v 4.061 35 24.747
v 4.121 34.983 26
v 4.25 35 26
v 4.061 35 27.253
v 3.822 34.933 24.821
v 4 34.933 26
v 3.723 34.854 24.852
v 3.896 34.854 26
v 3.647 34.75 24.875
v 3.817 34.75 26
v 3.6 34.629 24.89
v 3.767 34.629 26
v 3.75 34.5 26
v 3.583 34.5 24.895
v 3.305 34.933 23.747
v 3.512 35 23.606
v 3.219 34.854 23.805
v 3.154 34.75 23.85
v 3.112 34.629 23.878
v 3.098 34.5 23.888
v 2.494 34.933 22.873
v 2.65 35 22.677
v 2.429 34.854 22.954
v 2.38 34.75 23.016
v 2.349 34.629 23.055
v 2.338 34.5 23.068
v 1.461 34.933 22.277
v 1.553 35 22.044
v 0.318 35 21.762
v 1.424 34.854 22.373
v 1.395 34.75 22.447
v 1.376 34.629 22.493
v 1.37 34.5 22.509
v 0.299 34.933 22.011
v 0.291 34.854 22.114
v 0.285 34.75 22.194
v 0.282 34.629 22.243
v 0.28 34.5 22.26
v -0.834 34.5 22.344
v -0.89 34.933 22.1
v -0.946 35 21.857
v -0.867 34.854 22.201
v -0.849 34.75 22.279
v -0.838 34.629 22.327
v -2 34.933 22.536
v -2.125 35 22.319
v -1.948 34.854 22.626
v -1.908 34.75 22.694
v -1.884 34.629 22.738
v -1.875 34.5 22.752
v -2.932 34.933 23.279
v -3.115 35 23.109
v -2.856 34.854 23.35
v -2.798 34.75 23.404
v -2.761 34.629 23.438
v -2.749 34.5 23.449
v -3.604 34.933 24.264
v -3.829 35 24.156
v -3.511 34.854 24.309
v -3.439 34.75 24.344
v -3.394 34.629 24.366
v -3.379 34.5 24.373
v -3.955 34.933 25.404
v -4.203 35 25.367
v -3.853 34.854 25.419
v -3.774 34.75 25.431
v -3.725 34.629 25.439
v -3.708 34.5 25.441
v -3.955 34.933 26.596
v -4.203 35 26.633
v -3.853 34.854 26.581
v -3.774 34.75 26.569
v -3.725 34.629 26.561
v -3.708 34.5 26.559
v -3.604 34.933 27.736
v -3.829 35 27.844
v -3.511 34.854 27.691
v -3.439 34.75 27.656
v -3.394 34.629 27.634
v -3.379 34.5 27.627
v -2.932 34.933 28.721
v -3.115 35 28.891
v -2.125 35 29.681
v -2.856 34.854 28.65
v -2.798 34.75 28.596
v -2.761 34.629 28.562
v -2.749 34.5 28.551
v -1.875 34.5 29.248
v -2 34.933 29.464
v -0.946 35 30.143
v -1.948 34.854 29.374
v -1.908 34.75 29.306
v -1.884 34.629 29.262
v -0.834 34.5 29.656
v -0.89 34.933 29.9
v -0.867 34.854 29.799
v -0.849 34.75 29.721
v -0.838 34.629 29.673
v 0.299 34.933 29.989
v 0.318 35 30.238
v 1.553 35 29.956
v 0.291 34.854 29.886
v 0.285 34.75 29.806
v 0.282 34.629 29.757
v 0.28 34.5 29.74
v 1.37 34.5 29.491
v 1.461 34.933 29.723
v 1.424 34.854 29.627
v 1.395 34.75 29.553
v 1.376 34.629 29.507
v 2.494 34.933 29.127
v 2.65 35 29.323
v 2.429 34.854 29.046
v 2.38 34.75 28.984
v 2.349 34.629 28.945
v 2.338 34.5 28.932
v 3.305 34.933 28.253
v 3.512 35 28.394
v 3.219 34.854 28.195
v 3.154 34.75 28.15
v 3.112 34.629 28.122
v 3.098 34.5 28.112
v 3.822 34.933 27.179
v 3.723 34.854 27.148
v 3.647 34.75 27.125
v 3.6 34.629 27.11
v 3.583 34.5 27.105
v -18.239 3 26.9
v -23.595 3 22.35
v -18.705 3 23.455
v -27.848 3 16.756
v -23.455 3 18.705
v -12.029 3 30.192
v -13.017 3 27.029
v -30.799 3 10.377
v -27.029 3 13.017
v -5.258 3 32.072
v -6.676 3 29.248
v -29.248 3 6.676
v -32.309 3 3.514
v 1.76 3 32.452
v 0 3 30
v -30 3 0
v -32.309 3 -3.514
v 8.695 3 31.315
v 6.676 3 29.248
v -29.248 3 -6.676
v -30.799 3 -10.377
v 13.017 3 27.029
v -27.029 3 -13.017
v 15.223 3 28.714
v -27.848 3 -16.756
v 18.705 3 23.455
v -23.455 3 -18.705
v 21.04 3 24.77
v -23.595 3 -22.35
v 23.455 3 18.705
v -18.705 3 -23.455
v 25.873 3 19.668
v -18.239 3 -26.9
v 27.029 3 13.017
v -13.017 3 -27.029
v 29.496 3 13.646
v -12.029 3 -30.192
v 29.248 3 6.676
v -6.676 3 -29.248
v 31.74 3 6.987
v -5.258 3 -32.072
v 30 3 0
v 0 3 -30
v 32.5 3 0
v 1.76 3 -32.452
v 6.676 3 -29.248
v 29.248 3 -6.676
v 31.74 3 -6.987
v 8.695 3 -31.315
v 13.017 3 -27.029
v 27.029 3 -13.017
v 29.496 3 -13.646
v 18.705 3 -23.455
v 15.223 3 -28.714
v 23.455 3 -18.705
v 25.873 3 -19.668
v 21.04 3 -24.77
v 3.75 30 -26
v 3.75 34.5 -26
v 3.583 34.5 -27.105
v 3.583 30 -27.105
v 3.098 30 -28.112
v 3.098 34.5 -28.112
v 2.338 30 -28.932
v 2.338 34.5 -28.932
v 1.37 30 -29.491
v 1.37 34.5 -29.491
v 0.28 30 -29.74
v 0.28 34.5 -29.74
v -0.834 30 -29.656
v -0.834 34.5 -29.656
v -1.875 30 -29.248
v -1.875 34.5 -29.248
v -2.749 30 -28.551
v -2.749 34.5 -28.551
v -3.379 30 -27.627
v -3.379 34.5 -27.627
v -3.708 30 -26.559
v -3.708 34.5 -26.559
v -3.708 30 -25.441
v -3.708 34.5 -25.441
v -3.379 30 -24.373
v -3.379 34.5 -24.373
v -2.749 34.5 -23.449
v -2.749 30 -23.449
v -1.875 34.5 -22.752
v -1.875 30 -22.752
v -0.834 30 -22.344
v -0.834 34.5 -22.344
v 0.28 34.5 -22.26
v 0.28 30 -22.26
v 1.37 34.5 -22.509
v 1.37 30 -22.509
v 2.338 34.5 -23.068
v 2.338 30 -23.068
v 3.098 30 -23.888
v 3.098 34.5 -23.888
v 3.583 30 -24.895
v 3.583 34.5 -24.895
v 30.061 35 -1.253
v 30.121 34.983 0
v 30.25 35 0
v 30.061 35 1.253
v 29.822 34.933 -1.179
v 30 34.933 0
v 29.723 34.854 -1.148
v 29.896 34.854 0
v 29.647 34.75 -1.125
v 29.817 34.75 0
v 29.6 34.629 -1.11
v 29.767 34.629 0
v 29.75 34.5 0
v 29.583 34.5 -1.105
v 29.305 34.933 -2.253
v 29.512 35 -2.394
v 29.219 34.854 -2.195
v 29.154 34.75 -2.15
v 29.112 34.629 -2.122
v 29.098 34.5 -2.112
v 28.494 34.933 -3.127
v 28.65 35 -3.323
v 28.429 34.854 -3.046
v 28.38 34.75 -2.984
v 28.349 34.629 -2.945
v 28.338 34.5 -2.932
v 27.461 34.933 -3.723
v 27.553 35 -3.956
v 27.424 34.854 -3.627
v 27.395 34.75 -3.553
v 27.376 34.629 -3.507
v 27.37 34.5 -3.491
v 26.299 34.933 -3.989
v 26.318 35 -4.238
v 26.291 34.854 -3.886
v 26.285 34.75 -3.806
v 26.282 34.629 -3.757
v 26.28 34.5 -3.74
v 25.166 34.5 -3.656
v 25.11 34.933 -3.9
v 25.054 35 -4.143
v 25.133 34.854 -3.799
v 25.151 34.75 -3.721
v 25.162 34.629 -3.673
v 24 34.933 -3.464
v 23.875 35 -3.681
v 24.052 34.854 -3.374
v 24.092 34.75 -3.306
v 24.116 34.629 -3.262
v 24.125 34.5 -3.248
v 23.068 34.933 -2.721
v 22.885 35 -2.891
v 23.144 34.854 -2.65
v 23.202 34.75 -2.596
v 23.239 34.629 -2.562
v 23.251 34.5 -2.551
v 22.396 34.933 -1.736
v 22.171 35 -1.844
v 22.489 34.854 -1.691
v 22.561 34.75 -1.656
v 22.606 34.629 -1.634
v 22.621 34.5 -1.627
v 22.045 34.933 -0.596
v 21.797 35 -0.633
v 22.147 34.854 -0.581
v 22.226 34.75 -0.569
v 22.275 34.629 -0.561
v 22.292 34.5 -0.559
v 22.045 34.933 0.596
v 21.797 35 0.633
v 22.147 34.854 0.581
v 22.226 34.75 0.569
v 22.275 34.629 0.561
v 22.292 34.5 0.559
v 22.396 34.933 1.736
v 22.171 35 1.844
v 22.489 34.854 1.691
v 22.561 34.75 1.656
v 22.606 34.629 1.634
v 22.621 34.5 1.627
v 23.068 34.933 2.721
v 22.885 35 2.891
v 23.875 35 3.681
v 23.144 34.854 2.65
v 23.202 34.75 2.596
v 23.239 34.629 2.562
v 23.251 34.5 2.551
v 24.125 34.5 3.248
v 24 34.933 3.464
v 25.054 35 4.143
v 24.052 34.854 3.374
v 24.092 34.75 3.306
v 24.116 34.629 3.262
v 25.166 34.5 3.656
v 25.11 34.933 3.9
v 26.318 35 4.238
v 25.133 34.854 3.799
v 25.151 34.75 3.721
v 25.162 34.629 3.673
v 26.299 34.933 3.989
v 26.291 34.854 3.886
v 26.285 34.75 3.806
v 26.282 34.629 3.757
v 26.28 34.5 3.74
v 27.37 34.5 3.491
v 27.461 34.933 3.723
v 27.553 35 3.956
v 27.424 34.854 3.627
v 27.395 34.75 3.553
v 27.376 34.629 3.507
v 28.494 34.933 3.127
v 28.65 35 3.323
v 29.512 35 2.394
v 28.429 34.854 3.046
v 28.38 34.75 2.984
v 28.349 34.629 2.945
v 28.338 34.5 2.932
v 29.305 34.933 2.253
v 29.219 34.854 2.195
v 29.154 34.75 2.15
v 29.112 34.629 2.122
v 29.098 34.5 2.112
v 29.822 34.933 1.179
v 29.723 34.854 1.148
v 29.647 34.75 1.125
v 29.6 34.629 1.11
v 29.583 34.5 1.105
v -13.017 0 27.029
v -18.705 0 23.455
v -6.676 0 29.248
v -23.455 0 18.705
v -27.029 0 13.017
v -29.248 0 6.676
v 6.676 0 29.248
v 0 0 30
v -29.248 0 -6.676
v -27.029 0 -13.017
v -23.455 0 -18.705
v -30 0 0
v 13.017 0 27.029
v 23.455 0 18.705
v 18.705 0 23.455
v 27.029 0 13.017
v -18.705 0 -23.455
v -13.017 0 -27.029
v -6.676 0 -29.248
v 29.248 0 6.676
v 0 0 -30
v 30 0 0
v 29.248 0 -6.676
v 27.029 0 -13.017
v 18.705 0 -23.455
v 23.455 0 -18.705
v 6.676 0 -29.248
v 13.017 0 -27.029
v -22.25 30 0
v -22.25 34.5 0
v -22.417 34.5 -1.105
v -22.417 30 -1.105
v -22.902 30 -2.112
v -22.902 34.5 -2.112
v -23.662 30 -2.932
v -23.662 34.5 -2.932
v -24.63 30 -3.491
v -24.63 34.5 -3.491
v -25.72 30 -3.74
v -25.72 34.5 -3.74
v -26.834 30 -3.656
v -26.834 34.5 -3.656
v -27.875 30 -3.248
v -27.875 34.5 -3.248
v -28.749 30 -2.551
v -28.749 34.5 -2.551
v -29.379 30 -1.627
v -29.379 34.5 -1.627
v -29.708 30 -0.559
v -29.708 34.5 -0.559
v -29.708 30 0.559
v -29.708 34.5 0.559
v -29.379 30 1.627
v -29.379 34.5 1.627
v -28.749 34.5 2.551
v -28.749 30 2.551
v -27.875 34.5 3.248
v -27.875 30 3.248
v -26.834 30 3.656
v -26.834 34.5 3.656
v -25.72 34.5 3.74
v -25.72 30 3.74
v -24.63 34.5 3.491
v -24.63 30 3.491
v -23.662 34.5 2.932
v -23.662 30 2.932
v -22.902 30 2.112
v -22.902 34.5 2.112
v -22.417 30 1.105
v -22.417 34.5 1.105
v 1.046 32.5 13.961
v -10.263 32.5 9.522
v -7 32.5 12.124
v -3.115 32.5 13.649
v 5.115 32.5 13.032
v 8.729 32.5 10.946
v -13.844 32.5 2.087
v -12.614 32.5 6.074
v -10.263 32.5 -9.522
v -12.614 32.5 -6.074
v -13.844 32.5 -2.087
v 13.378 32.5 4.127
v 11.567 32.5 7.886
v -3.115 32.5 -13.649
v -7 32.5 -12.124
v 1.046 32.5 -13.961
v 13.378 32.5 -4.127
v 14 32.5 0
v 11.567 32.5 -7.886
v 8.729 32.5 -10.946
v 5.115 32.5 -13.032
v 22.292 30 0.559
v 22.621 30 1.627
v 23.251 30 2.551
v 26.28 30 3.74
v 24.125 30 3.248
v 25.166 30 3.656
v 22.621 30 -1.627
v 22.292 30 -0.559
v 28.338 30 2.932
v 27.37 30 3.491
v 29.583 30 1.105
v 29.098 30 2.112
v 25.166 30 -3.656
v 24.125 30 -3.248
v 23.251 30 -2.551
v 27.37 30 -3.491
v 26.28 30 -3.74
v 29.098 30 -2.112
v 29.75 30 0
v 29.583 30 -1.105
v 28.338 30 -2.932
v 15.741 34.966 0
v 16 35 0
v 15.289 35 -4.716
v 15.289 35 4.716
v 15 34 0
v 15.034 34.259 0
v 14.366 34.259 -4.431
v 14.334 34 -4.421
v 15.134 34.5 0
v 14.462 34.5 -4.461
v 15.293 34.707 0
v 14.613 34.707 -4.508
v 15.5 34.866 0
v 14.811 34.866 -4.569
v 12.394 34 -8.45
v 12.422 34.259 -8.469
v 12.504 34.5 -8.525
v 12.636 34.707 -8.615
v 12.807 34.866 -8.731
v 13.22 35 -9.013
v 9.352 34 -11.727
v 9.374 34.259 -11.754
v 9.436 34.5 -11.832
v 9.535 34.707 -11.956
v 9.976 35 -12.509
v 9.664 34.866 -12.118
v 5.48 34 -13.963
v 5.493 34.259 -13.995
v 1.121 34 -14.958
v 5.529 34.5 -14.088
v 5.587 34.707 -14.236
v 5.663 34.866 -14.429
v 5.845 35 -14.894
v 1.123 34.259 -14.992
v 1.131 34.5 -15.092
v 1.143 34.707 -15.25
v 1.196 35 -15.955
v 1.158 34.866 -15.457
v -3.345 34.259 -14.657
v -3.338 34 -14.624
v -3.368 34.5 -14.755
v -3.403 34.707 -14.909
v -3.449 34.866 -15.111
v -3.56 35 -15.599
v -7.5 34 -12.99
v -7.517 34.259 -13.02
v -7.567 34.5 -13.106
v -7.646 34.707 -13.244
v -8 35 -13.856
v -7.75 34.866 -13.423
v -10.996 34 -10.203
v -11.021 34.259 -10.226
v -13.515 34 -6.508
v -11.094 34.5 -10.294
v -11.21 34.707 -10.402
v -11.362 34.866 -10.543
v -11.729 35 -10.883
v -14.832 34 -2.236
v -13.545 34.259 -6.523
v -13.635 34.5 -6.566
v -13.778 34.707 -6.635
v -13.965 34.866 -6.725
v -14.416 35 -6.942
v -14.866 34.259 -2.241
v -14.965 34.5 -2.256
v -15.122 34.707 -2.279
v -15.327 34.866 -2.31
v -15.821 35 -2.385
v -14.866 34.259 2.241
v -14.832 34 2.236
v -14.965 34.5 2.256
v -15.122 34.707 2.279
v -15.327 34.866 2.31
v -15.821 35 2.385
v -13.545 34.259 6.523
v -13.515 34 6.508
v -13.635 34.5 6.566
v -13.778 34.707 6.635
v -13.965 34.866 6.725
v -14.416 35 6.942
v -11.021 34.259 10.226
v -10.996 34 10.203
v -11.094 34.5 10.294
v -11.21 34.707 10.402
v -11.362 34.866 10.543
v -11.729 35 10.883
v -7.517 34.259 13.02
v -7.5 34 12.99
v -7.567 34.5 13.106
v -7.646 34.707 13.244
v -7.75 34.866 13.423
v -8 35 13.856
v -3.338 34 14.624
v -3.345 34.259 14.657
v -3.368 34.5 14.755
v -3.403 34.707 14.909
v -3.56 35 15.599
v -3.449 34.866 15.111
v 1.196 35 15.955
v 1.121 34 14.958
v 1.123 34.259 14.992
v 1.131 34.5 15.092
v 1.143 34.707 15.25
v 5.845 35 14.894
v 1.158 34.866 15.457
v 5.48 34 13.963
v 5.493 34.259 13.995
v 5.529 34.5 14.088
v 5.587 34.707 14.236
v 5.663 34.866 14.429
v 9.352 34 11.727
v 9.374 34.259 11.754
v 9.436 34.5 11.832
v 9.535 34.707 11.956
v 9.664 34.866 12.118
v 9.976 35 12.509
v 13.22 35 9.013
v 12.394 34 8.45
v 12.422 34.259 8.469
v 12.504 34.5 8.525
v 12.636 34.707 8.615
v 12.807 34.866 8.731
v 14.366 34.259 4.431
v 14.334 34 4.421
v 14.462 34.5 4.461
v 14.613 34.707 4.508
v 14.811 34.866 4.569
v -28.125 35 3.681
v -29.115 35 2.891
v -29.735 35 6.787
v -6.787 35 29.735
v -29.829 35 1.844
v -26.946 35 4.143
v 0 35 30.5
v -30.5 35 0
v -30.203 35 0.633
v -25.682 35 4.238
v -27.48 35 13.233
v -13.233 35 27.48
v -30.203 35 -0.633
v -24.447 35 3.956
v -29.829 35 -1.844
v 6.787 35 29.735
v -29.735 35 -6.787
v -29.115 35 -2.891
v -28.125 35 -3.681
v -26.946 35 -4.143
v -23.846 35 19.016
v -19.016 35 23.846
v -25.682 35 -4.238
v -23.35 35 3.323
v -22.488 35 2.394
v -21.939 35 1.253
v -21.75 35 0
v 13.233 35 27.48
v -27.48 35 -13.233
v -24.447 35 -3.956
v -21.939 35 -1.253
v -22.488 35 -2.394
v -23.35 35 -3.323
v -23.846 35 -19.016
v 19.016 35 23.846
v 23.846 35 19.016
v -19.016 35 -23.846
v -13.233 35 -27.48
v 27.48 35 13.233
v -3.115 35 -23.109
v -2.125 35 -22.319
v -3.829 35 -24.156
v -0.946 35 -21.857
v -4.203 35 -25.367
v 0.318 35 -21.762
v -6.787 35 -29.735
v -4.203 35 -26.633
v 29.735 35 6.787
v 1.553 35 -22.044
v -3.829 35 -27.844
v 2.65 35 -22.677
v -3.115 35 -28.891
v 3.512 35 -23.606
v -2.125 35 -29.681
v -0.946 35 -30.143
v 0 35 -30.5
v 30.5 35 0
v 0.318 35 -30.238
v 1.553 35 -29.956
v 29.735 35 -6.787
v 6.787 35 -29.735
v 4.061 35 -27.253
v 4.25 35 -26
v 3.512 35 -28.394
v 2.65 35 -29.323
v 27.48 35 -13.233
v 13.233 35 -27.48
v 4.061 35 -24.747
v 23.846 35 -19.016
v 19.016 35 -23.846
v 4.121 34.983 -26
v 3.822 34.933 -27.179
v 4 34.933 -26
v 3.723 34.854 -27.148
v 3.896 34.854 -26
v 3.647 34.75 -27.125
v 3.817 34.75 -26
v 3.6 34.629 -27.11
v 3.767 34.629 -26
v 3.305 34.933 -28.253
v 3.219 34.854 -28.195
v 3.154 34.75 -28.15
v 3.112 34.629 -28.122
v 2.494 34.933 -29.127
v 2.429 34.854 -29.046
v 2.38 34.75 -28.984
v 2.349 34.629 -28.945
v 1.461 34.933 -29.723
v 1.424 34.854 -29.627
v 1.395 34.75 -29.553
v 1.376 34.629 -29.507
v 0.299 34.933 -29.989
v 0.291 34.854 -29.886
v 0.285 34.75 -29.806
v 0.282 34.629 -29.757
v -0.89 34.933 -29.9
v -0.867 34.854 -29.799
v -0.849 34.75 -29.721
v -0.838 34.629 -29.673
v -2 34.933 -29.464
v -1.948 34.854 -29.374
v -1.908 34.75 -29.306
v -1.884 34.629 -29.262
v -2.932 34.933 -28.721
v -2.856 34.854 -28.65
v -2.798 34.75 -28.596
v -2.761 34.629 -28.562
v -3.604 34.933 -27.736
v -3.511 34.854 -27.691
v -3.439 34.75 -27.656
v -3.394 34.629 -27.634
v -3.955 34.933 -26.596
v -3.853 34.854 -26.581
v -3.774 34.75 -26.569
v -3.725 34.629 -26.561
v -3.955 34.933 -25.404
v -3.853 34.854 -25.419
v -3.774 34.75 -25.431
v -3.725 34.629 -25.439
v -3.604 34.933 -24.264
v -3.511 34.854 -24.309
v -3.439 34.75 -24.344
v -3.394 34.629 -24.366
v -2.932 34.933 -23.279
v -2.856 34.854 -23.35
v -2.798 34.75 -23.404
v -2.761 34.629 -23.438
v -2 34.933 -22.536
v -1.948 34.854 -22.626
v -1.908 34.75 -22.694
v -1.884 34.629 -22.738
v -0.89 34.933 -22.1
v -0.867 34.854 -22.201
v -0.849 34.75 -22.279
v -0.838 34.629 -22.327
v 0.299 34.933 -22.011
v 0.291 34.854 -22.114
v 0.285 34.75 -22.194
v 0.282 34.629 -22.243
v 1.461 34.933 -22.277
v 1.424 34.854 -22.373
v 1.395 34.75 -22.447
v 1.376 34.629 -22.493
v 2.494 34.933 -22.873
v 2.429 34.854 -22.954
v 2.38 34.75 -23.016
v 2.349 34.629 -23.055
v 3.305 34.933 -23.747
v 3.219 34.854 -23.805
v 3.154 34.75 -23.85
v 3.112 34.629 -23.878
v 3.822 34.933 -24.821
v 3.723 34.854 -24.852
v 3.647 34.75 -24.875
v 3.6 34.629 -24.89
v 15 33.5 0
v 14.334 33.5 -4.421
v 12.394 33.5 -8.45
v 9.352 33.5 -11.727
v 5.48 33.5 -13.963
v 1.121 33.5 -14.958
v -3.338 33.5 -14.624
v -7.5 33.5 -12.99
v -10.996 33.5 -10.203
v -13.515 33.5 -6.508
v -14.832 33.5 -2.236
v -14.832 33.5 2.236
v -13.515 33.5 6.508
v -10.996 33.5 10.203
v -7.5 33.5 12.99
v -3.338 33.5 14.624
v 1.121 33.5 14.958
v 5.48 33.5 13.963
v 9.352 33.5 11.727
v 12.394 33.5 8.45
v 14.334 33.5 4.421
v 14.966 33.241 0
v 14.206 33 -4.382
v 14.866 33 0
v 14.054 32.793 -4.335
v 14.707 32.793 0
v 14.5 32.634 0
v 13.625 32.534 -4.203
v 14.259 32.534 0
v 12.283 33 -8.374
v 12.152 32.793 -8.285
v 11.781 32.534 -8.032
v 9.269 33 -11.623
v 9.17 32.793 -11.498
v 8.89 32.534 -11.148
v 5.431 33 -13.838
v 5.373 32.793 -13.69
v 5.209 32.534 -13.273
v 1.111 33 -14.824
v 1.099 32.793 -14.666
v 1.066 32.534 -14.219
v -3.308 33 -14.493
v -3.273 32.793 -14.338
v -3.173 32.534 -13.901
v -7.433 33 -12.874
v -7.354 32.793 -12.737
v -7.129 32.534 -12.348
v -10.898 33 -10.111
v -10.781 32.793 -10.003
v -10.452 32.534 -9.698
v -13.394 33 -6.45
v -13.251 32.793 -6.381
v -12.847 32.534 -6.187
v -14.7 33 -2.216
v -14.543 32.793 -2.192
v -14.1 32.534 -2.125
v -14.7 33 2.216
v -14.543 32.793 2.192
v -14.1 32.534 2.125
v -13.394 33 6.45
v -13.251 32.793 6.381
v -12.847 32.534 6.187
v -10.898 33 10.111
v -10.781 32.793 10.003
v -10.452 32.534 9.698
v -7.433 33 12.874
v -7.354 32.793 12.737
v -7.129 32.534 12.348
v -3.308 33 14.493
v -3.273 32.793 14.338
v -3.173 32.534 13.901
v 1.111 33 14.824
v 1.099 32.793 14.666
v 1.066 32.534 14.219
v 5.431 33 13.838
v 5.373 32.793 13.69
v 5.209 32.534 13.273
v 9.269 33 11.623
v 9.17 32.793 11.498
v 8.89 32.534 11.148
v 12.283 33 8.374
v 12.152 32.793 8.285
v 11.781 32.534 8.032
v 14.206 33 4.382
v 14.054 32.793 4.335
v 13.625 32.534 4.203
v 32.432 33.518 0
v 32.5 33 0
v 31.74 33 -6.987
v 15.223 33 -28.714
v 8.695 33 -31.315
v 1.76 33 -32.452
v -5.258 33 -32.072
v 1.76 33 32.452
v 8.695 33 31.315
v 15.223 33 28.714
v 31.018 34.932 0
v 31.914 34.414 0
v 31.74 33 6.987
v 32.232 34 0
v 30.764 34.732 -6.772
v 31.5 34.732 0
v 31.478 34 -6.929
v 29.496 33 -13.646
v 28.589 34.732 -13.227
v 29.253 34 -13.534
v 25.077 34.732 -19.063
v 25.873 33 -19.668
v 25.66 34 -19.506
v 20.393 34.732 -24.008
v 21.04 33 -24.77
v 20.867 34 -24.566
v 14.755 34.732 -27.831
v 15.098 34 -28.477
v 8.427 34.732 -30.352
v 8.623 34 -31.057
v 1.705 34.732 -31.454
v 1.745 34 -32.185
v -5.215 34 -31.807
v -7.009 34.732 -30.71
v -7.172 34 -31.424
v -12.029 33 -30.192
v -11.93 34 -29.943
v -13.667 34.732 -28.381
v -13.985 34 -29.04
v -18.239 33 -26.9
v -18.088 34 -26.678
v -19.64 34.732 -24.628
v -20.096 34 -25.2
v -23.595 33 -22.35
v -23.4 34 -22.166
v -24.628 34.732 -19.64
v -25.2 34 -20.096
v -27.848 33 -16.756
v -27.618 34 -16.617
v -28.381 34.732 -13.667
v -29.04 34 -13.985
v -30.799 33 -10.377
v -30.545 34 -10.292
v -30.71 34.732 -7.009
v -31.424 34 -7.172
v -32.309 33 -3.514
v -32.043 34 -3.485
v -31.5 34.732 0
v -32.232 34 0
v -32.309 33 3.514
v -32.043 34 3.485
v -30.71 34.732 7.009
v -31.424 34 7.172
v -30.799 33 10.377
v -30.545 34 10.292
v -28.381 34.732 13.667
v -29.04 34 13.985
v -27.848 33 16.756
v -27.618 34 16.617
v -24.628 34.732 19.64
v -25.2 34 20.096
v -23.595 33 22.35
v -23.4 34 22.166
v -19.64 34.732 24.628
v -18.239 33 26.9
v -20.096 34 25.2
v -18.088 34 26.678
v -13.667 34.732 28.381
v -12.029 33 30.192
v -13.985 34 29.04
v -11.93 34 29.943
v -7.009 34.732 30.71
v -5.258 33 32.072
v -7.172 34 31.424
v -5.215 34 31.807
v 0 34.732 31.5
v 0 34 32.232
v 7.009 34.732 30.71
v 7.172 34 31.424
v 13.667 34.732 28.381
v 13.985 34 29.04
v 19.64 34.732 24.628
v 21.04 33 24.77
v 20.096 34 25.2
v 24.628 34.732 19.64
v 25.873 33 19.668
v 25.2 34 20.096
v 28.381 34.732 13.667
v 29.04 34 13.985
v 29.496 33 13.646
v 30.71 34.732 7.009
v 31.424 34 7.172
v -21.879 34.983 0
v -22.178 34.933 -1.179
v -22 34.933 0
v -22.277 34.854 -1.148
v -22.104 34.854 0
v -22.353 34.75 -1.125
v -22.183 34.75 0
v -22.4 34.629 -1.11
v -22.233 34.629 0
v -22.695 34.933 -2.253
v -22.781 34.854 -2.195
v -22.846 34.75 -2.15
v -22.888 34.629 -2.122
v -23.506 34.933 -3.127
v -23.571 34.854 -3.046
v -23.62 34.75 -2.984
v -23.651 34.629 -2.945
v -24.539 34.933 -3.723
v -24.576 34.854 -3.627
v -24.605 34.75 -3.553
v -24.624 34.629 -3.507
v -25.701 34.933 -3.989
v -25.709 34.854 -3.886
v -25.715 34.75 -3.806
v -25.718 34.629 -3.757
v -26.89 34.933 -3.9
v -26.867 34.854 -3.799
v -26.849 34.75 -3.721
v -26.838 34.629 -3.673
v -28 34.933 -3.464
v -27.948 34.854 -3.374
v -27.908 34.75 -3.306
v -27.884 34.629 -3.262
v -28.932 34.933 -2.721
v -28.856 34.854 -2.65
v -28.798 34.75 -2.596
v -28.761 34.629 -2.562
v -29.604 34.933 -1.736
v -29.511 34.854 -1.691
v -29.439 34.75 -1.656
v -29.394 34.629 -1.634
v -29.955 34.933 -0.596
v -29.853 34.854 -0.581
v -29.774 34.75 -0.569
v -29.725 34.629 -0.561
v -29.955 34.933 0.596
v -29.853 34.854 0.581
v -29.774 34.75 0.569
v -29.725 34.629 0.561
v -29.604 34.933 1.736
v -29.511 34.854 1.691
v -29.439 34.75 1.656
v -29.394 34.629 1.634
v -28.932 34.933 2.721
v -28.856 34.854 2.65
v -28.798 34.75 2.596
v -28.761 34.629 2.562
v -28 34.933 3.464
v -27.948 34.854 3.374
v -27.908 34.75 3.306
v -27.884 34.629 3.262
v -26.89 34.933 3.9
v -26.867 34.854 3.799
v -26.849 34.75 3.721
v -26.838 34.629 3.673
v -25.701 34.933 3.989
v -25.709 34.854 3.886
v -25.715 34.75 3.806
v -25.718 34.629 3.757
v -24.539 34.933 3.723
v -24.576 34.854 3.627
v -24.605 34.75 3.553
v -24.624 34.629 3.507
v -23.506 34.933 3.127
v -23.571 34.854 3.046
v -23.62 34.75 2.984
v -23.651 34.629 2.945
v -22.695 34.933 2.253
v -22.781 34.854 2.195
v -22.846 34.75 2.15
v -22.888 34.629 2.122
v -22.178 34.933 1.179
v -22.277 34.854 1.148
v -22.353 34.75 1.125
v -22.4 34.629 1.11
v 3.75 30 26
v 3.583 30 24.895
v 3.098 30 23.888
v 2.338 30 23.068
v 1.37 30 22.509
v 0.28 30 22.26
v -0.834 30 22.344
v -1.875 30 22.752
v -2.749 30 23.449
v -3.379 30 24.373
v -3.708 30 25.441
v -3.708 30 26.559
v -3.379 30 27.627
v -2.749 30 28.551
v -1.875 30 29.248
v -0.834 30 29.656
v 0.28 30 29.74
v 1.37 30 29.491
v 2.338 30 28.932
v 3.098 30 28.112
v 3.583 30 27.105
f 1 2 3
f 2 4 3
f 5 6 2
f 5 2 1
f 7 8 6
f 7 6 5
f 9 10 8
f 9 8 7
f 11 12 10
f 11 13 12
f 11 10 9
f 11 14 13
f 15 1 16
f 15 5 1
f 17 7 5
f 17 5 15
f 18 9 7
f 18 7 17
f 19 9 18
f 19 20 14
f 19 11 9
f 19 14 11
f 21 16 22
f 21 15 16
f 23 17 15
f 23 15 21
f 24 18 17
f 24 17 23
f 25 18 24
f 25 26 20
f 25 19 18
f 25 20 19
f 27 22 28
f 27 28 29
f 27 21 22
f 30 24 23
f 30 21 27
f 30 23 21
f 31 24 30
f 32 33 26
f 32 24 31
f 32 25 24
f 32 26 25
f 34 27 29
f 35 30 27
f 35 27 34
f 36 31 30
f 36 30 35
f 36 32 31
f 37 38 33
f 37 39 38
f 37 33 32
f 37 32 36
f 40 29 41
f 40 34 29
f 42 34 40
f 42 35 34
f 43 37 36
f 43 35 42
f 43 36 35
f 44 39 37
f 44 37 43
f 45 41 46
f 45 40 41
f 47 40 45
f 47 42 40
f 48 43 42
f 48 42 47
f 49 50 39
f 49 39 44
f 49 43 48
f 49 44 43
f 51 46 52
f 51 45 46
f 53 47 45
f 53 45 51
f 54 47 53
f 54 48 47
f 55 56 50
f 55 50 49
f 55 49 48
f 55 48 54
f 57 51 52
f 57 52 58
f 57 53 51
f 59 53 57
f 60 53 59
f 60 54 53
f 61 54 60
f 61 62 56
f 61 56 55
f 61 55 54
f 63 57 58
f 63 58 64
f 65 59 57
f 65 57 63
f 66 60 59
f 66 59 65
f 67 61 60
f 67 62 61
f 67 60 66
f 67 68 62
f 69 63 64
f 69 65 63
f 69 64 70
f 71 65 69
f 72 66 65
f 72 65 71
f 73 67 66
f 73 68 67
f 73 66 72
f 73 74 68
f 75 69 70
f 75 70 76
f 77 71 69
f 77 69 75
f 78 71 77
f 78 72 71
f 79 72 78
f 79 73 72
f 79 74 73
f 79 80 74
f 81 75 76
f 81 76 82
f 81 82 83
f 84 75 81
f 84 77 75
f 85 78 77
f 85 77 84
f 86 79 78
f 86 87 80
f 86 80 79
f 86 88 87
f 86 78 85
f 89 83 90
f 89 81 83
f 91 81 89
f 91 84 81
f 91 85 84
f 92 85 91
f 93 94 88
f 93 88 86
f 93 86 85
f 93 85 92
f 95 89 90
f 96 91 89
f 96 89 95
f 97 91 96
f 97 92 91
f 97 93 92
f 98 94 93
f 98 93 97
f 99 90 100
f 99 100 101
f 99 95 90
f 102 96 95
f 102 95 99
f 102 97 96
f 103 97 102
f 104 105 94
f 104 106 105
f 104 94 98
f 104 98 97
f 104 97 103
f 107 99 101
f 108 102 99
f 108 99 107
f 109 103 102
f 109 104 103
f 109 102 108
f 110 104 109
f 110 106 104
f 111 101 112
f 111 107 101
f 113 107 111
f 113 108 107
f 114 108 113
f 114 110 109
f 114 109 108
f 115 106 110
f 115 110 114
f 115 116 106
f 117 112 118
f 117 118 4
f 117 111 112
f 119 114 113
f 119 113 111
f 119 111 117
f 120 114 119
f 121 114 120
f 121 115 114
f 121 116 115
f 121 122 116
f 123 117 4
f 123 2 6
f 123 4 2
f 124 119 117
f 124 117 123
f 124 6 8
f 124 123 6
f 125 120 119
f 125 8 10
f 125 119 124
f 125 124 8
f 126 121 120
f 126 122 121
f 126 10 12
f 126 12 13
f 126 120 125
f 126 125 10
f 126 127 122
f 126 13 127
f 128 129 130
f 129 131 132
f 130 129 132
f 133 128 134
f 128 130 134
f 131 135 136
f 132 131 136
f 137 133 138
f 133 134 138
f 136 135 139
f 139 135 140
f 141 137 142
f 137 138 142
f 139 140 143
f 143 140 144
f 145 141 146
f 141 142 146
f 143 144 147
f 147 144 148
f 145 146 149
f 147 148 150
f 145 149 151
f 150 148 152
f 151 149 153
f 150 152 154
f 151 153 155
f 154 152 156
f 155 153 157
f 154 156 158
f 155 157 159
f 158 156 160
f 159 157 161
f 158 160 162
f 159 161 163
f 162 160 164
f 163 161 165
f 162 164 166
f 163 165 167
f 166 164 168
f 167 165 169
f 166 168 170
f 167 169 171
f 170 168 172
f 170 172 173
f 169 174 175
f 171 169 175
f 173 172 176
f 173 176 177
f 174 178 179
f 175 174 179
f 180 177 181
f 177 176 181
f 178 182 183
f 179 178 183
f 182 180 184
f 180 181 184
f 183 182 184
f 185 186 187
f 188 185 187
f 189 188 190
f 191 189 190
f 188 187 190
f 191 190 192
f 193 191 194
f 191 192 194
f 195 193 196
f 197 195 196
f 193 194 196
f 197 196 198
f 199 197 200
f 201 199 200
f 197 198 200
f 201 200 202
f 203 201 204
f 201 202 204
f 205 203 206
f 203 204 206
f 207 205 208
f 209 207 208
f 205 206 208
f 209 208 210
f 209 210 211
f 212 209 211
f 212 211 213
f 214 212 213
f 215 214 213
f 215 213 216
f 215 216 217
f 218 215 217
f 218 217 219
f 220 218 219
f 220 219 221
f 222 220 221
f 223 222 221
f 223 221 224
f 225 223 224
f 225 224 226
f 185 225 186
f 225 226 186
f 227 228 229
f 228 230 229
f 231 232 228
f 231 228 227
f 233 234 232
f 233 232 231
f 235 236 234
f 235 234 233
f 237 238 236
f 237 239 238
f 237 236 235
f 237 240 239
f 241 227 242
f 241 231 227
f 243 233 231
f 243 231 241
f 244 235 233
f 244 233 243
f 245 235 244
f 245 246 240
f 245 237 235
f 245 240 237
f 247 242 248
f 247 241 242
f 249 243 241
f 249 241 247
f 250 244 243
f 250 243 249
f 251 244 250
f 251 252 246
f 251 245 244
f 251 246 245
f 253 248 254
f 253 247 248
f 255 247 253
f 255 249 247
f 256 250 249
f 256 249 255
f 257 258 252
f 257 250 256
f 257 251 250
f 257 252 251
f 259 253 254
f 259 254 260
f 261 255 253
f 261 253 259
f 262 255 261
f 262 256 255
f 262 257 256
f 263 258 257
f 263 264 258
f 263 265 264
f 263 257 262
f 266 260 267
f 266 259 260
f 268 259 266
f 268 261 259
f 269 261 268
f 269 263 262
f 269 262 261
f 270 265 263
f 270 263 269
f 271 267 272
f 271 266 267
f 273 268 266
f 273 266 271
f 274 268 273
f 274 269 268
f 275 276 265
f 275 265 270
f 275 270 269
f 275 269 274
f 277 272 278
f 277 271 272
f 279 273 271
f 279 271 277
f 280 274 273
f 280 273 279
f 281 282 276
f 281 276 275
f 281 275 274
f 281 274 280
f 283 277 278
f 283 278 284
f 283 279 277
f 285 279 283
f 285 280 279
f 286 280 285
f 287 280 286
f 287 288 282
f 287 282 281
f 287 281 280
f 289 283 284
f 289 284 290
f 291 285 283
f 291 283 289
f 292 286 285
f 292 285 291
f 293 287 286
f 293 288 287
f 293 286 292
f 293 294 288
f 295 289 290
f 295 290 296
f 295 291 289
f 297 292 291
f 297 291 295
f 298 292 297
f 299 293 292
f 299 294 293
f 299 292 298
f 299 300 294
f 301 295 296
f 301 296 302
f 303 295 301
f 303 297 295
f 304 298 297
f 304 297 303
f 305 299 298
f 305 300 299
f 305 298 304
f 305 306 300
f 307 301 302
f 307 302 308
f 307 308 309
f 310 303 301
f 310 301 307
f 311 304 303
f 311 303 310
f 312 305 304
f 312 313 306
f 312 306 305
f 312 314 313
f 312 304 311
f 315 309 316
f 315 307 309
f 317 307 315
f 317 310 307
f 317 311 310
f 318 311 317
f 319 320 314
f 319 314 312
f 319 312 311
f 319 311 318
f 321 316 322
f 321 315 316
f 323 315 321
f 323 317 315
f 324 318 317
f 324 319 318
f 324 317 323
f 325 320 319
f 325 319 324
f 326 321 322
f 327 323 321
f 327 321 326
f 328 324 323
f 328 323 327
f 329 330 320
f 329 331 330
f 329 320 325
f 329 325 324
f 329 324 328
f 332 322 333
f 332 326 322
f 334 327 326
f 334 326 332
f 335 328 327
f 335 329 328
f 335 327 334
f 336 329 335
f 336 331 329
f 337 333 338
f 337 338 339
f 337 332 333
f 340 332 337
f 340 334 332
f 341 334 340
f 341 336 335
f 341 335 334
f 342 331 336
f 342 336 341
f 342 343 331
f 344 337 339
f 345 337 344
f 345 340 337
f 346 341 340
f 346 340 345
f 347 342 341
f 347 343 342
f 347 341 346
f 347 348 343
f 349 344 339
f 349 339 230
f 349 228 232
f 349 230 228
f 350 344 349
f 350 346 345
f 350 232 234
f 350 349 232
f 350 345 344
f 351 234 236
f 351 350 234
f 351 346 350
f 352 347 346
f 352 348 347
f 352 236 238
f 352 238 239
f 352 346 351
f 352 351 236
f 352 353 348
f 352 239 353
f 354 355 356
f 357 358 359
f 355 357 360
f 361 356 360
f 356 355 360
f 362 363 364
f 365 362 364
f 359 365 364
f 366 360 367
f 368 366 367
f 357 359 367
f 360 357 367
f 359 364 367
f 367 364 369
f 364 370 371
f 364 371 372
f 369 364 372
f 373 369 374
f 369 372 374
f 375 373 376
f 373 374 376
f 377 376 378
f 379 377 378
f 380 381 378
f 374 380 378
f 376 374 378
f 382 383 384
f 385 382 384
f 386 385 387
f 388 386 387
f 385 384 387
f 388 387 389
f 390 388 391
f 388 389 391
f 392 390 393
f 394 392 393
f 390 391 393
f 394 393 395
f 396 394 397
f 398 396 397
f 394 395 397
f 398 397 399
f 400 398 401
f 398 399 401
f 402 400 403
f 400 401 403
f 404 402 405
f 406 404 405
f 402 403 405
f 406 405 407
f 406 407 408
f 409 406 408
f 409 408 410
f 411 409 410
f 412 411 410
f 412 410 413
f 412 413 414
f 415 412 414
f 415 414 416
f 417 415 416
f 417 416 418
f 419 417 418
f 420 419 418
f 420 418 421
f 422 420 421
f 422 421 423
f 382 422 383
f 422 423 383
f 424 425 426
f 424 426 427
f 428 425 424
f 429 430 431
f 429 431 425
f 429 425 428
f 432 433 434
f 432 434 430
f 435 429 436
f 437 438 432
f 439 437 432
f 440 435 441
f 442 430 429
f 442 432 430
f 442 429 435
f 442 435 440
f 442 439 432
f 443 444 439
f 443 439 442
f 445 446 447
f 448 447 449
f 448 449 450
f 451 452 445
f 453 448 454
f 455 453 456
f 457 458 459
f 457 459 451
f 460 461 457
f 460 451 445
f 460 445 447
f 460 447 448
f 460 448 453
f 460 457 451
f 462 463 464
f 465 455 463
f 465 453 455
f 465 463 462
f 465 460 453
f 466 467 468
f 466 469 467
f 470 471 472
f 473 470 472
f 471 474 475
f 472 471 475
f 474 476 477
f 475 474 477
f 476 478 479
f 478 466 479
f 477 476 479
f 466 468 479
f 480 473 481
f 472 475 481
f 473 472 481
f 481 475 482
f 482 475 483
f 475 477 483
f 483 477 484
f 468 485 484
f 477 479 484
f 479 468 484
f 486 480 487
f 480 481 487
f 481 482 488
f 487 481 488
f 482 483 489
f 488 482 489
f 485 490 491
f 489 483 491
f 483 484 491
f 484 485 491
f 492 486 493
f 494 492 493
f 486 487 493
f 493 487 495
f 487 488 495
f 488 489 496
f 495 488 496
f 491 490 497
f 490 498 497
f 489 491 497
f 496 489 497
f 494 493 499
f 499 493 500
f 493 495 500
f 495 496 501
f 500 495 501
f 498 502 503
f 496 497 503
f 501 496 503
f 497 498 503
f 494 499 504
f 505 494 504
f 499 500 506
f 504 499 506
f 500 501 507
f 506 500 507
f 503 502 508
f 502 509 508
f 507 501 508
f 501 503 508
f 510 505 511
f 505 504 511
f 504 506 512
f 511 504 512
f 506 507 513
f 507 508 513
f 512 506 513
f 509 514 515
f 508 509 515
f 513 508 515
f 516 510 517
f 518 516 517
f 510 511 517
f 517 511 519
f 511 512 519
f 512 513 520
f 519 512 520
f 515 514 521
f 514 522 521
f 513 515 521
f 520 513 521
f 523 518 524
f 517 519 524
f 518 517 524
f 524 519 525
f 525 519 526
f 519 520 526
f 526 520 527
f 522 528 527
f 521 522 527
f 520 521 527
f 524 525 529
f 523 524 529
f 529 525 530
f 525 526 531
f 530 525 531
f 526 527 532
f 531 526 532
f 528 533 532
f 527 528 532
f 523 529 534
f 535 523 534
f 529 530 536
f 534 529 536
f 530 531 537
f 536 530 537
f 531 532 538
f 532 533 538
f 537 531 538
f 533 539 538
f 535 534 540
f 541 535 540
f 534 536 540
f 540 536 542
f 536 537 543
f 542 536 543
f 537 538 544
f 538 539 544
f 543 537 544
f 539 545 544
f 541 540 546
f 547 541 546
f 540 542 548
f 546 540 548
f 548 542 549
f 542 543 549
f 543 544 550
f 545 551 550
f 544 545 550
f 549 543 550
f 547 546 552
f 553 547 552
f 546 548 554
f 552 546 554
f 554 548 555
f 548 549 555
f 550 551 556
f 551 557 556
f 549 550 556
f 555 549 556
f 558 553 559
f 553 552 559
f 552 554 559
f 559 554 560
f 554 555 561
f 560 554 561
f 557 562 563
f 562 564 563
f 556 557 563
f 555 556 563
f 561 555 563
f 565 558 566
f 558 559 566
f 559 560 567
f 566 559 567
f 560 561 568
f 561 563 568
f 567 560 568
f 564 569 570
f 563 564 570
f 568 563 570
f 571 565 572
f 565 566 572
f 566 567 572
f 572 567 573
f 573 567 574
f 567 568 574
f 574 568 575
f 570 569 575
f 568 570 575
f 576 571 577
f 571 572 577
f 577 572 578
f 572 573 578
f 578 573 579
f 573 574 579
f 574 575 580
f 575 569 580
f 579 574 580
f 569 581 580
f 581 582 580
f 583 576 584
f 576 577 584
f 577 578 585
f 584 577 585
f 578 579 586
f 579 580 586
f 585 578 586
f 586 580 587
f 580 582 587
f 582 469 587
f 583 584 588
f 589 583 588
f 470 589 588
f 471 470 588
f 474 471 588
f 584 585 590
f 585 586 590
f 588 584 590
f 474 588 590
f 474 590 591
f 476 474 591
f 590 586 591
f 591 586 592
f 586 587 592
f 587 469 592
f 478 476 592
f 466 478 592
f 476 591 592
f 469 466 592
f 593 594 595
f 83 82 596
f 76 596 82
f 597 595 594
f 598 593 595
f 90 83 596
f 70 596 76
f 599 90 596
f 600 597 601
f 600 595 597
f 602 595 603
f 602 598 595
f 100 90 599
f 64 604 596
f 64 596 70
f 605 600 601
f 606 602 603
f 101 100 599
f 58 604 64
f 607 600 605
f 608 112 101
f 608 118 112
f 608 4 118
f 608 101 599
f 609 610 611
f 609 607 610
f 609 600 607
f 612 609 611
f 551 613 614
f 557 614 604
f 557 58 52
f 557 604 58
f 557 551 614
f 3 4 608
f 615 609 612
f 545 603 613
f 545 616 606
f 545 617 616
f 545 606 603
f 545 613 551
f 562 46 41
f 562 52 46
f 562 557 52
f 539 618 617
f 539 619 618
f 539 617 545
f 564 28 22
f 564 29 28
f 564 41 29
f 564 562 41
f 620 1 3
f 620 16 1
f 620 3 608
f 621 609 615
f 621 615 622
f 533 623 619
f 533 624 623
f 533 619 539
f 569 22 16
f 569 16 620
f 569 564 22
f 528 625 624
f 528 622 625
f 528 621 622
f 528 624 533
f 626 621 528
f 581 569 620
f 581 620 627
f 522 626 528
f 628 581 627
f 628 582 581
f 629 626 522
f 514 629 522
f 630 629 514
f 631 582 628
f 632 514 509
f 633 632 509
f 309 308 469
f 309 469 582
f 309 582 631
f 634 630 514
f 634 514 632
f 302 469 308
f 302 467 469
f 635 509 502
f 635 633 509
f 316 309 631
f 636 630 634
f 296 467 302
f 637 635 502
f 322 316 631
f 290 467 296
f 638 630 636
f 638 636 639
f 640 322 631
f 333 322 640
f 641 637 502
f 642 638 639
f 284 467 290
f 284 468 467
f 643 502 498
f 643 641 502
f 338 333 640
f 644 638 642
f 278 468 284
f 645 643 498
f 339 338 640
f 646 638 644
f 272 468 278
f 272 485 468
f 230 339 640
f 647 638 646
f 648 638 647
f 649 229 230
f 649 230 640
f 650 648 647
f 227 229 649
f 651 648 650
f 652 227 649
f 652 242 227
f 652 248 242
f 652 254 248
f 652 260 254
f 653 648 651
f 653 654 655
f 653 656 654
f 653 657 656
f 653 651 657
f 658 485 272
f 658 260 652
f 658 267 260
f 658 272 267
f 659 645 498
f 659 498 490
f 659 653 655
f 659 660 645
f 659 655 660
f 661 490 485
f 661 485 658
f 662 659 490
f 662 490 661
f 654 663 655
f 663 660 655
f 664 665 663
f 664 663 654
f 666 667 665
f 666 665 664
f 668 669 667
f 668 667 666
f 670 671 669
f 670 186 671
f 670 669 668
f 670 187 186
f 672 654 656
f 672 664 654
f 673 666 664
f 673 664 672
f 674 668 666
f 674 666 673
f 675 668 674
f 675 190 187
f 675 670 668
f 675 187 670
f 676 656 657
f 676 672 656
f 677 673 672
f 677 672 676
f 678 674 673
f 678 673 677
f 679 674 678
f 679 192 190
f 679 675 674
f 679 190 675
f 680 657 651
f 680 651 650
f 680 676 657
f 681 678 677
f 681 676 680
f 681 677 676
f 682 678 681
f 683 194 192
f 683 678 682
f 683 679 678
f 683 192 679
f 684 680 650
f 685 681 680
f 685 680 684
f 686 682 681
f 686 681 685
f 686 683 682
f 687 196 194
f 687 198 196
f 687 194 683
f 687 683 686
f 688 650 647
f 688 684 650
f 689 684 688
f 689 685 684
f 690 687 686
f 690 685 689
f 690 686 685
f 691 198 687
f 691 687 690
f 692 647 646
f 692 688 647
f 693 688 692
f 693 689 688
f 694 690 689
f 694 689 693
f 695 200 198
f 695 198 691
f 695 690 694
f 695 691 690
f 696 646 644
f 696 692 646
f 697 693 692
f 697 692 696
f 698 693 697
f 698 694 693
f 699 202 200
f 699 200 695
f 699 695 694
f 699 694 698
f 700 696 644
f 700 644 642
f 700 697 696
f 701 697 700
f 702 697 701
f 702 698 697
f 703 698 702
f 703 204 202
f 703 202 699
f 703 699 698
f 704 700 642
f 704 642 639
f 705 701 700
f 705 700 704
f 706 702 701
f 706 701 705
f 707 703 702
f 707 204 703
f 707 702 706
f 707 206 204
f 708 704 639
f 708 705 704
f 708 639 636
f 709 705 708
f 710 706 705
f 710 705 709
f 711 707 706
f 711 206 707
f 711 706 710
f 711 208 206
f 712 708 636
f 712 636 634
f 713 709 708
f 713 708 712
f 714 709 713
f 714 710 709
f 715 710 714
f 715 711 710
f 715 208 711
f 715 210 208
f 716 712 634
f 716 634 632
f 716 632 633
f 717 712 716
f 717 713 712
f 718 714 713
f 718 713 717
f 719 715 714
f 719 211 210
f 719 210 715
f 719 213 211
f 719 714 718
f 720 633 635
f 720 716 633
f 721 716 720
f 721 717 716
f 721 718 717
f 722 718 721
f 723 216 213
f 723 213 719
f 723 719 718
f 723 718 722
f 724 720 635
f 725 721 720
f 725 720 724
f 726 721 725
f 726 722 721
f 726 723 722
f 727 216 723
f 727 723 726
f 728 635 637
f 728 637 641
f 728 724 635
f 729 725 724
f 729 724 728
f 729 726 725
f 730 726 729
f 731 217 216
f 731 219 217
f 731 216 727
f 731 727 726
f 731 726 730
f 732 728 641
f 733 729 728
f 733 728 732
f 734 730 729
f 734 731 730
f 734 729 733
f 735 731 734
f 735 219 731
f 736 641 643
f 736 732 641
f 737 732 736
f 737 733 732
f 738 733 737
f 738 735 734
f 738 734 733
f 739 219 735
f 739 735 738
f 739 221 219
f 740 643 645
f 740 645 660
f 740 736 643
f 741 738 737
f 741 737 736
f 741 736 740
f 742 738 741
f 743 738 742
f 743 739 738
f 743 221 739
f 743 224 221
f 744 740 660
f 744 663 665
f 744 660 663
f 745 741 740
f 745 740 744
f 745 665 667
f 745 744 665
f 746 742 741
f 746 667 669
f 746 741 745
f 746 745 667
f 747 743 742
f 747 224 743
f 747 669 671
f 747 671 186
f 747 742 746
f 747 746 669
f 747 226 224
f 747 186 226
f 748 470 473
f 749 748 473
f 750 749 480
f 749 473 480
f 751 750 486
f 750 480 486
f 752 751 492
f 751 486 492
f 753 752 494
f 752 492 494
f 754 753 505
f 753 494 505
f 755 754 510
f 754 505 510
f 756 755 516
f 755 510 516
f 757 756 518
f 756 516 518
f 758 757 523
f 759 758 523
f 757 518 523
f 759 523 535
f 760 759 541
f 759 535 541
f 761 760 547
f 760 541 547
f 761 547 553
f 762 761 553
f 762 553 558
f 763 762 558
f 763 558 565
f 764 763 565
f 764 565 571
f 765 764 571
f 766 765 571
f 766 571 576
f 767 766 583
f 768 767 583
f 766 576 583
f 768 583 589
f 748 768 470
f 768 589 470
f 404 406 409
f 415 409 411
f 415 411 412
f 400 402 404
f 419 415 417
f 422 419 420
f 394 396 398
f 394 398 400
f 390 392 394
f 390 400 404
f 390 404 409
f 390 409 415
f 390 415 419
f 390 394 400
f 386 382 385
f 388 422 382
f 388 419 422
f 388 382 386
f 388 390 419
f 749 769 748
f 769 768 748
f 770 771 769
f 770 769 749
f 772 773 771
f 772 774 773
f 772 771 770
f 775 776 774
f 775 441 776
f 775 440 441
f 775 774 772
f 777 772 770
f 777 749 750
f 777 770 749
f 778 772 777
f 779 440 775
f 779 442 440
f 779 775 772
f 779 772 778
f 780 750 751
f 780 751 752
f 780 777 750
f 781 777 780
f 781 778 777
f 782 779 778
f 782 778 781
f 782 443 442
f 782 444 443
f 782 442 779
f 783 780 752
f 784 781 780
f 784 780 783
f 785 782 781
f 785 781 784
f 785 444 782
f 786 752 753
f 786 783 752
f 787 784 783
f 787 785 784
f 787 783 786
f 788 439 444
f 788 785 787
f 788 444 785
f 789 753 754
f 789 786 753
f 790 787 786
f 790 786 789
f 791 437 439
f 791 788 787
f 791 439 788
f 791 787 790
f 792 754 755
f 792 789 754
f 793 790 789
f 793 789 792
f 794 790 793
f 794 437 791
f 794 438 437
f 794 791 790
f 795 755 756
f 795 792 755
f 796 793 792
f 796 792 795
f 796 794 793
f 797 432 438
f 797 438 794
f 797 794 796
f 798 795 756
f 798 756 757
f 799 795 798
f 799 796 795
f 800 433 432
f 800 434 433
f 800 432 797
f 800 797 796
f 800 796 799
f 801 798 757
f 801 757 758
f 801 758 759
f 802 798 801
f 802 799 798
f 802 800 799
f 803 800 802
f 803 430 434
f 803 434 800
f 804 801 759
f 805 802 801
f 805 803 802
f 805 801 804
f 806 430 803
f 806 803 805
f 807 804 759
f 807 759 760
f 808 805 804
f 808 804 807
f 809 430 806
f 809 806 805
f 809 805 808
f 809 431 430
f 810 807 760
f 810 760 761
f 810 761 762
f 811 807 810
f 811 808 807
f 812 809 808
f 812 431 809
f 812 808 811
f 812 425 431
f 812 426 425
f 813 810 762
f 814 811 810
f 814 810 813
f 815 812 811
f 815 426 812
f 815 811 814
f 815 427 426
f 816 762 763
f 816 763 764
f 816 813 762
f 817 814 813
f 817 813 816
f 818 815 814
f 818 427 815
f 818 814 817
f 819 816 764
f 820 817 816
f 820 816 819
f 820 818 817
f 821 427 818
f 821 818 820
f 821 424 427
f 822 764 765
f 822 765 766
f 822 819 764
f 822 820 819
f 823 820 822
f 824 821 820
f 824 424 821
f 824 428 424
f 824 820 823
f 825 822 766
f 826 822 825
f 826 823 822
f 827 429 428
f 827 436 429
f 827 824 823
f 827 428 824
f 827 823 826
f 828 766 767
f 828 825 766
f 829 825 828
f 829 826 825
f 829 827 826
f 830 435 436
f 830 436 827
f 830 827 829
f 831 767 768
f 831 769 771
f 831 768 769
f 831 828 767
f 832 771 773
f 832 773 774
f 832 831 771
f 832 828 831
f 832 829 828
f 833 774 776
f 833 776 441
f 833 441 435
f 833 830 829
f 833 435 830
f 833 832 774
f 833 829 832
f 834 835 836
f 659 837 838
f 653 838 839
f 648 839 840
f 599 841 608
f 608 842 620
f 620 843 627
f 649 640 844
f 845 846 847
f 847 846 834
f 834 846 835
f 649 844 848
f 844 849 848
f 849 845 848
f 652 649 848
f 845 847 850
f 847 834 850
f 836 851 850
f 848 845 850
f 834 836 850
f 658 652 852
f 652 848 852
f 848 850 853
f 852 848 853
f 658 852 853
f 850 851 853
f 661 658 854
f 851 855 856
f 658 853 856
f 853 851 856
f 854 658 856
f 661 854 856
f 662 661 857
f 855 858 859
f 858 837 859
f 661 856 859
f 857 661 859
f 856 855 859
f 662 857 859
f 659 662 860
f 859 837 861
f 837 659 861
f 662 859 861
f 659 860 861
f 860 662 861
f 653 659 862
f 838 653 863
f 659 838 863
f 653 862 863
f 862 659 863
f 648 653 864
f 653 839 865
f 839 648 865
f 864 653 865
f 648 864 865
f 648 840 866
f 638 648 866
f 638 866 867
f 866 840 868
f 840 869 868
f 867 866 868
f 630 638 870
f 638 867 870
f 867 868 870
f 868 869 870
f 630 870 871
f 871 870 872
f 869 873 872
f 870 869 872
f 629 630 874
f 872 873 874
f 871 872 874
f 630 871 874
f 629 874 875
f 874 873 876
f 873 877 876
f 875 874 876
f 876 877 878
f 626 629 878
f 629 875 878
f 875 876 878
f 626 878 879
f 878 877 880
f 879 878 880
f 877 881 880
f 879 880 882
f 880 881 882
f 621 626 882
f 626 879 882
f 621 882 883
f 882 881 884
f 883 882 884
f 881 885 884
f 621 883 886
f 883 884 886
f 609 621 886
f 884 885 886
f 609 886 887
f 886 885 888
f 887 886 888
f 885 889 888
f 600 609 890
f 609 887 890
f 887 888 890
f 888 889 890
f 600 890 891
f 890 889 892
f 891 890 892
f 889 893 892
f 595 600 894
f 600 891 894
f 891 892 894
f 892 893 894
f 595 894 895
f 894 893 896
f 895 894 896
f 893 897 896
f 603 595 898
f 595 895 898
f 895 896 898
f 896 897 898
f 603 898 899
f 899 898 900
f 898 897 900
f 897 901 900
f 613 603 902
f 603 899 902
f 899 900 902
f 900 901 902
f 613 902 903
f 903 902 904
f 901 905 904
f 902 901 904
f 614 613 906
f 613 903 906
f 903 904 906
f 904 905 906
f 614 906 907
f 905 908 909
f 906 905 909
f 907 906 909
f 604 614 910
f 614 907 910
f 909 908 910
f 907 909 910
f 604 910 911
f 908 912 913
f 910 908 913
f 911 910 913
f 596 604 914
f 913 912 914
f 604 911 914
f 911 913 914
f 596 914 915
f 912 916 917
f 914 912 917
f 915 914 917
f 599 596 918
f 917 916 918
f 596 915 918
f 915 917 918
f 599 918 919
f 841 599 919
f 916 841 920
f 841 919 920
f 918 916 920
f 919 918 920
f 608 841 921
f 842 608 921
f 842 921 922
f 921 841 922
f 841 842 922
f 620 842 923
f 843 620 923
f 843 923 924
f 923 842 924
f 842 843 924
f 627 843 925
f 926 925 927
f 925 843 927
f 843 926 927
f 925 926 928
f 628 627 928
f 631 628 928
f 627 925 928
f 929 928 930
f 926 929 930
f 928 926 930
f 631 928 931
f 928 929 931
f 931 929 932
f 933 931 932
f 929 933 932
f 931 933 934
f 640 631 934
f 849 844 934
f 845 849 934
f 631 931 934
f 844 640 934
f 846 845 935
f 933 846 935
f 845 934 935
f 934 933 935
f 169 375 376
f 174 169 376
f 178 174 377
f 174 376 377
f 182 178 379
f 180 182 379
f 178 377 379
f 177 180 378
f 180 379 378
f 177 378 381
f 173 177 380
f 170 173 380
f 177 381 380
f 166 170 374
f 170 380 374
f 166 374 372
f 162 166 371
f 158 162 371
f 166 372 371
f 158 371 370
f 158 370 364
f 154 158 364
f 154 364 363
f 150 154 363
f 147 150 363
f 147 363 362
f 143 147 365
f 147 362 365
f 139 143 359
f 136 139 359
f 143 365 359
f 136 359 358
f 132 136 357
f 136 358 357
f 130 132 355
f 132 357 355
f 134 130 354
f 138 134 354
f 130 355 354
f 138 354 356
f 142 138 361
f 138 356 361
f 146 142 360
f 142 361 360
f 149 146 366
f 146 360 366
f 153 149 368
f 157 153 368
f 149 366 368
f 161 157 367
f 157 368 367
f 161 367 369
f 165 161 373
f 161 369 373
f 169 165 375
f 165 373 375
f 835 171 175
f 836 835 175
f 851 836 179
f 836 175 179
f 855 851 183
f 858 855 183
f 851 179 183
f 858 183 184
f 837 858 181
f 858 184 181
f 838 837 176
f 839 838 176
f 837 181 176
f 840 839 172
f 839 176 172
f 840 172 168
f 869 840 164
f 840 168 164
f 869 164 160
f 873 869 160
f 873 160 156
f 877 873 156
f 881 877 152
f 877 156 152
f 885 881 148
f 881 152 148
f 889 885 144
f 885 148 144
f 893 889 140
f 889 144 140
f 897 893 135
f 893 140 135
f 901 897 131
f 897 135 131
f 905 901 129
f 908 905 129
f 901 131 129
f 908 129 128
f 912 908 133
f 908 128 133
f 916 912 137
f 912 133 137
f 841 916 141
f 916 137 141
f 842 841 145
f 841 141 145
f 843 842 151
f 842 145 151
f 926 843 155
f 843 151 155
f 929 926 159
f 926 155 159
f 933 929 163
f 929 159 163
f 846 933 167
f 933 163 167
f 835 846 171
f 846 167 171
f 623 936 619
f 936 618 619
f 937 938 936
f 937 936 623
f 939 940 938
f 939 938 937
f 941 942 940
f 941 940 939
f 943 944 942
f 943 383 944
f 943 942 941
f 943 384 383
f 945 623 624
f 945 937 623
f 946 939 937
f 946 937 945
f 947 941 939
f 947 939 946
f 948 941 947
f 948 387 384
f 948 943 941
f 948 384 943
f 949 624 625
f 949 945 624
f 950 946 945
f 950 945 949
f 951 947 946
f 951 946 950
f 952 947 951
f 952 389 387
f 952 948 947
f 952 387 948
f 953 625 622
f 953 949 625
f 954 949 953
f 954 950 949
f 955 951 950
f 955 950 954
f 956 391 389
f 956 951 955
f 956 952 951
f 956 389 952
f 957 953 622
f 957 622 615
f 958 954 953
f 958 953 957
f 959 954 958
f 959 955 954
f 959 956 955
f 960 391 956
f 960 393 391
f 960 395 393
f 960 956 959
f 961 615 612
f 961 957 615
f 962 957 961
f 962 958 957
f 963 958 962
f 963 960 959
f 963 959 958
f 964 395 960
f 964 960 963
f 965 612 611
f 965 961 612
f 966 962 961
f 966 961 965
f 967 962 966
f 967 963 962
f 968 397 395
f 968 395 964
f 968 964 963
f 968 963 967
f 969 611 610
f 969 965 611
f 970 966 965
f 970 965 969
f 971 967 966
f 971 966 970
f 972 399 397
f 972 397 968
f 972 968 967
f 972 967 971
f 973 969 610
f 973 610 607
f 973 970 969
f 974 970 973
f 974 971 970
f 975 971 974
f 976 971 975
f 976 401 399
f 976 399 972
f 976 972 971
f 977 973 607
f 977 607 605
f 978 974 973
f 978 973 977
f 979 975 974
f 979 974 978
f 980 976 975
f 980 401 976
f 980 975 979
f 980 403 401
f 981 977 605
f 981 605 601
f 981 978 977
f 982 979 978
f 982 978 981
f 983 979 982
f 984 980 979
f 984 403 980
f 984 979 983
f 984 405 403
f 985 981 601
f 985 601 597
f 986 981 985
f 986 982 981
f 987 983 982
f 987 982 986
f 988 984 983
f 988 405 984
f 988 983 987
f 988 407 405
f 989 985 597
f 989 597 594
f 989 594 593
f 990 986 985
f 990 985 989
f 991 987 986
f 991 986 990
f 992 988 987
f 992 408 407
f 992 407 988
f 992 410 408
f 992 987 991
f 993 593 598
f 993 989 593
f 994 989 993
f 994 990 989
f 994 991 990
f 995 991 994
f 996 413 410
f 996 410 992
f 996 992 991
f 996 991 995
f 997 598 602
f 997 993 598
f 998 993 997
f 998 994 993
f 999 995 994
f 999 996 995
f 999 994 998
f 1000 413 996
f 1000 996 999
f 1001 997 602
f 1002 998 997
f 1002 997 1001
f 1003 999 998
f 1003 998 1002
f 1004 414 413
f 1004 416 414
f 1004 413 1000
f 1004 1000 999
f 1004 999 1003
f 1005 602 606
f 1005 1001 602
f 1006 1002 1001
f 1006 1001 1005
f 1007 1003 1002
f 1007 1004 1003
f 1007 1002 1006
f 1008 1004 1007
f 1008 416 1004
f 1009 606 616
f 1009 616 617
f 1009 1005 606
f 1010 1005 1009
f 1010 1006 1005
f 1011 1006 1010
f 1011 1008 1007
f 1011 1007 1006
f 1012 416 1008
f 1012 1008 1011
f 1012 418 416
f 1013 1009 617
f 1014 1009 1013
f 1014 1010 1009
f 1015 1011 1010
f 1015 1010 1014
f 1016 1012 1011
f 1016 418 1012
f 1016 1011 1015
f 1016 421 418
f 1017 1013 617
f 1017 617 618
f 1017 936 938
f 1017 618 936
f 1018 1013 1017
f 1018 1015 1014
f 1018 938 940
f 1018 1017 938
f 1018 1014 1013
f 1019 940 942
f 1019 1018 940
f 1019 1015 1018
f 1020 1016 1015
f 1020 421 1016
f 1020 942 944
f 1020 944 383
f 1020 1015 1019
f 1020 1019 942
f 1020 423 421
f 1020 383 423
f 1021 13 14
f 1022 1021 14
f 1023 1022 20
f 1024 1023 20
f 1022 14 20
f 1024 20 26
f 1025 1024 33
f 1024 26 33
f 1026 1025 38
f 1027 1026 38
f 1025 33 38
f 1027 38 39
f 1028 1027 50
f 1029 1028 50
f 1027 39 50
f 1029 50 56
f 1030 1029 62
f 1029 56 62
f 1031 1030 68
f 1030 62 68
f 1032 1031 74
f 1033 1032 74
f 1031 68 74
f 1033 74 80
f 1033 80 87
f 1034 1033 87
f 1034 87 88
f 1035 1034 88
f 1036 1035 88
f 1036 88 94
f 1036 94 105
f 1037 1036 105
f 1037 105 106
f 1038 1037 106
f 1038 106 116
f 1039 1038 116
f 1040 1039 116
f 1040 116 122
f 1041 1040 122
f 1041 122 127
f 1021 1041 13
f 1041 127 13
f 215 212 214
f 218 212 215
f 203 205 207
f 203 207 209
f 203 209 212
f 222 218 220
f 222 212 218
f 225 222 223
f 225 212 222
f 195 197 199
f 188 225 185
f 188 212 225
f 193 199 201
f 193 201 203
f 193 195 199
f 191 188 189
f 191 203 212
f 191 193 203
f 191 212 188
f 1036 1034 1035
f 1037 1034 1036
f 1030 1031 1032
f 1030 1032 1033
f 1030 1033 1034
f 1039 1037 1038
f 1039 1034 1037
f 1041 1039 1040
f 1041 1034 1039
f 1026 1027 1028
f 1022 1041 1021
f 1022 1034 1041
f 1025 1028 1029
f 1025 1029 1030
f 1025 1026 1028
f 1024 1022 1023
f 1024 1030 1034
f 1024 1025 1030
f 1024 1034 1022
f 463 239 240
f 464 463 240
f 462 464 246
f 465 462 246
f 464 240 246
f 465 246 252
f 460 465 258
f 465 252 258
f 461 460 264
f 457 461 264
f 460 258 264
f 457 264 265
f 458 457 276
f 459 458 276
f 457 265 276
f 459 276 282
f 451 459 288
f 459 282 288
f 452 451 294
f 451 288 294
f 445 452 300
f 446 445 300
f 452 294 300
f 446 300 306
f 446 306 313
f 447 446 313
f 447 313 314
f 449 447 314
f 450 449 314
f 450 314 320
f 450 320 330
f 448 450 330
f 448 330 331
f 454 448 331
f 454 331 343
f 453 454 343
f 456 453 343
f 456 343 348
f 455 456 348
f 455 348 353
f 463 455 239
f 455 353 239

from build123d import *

# Parameters (mm, degrees)
SKETCH2_R           = 30
BOSS_EXTRUDE1_DEPTH = 3
SKETCH3_R           = 32.5
BOSS_EXTRUDE2_DEPTH = 32
SKETCH4_R           = 15
CUT_EXTRUDE1_DEPTH  = 2.5
SKETCH4_3_R         = 3.75
CUT_EXTRUDE2_DEPTH  = 5
FILLET1_R           = 1
FILLET2_R           = 1
FILLET3_R           = 2
FILLET4_R           = 0.5


with BuildPart() as part:
    # Sketch2 → Boss-Extrude1 (new body)
    with BuildSketch(Plane(origin=(0, 0, 0), x_dir=(1, 0, 0), z_dir=(0, 1, 0))):
        Circle(SKETCH2_R)
    extrude(amount=BOSS_EXTRUDE1_DEPTH)

    # Sketch3 → Boss-Extrude2 (add)
    with BuildSketch(Plane(origin=(0, 3, 0), x_dir=(1, 0, 0), z_dir=(0, 1, 0))):
        Circle(SKETCH3_R)
    extrude(amount=BOSS_EXTRUDE2_DEPTH)

    # Sketch4 → Cut-Extrude1 (cut)
    with BuildSketch(Plane(origin=(0, 35, 0), x_dir=(1, 0, 0), z_dir=(0, 1, 0))):
        Circle(SKETCH4_R)
    extrude(amount=-CUT_EXTRUDE1_DEPTH, mode=Mode.SUBTRACT)

    # Sketch4_3 → Cut-Extrude2 (cut)
    with BuildSketch(Plane(origin=(0, 35, 0), x_dir=(1, 0, 0), z_dir=(0, 1, 0))):
        with Locations((0, 26)):
            Circle(SKETCH4_3_R)
        with Locations((26, 0)):
            Circle(SKETCH4_3_R)
        with Locations((0, -26)):
            Circle(SKETCH4_3_R)
        with Locations((-26, 0)):
            Circle(SKETCH4_3_R)
    extrude(amount=-CUT_EXTRUDE2_DEPTH, mode=Mode.SUBTRACT)

    # Fillet1
    fillet1_edges = [part.edges().sort_by_distance(p)[0] for p in [
        (-15, 32.5, 0),
    ]]
    fillet(fillet1_edges, radius=FILLET1_R)

    # Fillet2
    fillet2_edges = [part.edges().sort_by_distance(p)[0] for p in [
        (-15, 35, 0),
    ]]
    fillet(fillet2_edges, radius=FILLET2_R)

    # Fillet3
    fillet3_edges = [part.edges().sort_by_distance(p)[0] for p in [
        (-32.5, 35, 0),
    ]]
    fillet(fillet3_edges, radius=FILLET3_R)

    # Fillet4
    fillet4_edges = [part.edges().sort_by_distance(p)[0] for p in [
        (-29.75, 35, 0),
        (-3.75, 35, -26),
        (22.25, 35, 0),
        (-3.75, 35, 26),
    ]]
    fillet(fillet4_edges, radius=FILLET4_R)


solid = part.part
